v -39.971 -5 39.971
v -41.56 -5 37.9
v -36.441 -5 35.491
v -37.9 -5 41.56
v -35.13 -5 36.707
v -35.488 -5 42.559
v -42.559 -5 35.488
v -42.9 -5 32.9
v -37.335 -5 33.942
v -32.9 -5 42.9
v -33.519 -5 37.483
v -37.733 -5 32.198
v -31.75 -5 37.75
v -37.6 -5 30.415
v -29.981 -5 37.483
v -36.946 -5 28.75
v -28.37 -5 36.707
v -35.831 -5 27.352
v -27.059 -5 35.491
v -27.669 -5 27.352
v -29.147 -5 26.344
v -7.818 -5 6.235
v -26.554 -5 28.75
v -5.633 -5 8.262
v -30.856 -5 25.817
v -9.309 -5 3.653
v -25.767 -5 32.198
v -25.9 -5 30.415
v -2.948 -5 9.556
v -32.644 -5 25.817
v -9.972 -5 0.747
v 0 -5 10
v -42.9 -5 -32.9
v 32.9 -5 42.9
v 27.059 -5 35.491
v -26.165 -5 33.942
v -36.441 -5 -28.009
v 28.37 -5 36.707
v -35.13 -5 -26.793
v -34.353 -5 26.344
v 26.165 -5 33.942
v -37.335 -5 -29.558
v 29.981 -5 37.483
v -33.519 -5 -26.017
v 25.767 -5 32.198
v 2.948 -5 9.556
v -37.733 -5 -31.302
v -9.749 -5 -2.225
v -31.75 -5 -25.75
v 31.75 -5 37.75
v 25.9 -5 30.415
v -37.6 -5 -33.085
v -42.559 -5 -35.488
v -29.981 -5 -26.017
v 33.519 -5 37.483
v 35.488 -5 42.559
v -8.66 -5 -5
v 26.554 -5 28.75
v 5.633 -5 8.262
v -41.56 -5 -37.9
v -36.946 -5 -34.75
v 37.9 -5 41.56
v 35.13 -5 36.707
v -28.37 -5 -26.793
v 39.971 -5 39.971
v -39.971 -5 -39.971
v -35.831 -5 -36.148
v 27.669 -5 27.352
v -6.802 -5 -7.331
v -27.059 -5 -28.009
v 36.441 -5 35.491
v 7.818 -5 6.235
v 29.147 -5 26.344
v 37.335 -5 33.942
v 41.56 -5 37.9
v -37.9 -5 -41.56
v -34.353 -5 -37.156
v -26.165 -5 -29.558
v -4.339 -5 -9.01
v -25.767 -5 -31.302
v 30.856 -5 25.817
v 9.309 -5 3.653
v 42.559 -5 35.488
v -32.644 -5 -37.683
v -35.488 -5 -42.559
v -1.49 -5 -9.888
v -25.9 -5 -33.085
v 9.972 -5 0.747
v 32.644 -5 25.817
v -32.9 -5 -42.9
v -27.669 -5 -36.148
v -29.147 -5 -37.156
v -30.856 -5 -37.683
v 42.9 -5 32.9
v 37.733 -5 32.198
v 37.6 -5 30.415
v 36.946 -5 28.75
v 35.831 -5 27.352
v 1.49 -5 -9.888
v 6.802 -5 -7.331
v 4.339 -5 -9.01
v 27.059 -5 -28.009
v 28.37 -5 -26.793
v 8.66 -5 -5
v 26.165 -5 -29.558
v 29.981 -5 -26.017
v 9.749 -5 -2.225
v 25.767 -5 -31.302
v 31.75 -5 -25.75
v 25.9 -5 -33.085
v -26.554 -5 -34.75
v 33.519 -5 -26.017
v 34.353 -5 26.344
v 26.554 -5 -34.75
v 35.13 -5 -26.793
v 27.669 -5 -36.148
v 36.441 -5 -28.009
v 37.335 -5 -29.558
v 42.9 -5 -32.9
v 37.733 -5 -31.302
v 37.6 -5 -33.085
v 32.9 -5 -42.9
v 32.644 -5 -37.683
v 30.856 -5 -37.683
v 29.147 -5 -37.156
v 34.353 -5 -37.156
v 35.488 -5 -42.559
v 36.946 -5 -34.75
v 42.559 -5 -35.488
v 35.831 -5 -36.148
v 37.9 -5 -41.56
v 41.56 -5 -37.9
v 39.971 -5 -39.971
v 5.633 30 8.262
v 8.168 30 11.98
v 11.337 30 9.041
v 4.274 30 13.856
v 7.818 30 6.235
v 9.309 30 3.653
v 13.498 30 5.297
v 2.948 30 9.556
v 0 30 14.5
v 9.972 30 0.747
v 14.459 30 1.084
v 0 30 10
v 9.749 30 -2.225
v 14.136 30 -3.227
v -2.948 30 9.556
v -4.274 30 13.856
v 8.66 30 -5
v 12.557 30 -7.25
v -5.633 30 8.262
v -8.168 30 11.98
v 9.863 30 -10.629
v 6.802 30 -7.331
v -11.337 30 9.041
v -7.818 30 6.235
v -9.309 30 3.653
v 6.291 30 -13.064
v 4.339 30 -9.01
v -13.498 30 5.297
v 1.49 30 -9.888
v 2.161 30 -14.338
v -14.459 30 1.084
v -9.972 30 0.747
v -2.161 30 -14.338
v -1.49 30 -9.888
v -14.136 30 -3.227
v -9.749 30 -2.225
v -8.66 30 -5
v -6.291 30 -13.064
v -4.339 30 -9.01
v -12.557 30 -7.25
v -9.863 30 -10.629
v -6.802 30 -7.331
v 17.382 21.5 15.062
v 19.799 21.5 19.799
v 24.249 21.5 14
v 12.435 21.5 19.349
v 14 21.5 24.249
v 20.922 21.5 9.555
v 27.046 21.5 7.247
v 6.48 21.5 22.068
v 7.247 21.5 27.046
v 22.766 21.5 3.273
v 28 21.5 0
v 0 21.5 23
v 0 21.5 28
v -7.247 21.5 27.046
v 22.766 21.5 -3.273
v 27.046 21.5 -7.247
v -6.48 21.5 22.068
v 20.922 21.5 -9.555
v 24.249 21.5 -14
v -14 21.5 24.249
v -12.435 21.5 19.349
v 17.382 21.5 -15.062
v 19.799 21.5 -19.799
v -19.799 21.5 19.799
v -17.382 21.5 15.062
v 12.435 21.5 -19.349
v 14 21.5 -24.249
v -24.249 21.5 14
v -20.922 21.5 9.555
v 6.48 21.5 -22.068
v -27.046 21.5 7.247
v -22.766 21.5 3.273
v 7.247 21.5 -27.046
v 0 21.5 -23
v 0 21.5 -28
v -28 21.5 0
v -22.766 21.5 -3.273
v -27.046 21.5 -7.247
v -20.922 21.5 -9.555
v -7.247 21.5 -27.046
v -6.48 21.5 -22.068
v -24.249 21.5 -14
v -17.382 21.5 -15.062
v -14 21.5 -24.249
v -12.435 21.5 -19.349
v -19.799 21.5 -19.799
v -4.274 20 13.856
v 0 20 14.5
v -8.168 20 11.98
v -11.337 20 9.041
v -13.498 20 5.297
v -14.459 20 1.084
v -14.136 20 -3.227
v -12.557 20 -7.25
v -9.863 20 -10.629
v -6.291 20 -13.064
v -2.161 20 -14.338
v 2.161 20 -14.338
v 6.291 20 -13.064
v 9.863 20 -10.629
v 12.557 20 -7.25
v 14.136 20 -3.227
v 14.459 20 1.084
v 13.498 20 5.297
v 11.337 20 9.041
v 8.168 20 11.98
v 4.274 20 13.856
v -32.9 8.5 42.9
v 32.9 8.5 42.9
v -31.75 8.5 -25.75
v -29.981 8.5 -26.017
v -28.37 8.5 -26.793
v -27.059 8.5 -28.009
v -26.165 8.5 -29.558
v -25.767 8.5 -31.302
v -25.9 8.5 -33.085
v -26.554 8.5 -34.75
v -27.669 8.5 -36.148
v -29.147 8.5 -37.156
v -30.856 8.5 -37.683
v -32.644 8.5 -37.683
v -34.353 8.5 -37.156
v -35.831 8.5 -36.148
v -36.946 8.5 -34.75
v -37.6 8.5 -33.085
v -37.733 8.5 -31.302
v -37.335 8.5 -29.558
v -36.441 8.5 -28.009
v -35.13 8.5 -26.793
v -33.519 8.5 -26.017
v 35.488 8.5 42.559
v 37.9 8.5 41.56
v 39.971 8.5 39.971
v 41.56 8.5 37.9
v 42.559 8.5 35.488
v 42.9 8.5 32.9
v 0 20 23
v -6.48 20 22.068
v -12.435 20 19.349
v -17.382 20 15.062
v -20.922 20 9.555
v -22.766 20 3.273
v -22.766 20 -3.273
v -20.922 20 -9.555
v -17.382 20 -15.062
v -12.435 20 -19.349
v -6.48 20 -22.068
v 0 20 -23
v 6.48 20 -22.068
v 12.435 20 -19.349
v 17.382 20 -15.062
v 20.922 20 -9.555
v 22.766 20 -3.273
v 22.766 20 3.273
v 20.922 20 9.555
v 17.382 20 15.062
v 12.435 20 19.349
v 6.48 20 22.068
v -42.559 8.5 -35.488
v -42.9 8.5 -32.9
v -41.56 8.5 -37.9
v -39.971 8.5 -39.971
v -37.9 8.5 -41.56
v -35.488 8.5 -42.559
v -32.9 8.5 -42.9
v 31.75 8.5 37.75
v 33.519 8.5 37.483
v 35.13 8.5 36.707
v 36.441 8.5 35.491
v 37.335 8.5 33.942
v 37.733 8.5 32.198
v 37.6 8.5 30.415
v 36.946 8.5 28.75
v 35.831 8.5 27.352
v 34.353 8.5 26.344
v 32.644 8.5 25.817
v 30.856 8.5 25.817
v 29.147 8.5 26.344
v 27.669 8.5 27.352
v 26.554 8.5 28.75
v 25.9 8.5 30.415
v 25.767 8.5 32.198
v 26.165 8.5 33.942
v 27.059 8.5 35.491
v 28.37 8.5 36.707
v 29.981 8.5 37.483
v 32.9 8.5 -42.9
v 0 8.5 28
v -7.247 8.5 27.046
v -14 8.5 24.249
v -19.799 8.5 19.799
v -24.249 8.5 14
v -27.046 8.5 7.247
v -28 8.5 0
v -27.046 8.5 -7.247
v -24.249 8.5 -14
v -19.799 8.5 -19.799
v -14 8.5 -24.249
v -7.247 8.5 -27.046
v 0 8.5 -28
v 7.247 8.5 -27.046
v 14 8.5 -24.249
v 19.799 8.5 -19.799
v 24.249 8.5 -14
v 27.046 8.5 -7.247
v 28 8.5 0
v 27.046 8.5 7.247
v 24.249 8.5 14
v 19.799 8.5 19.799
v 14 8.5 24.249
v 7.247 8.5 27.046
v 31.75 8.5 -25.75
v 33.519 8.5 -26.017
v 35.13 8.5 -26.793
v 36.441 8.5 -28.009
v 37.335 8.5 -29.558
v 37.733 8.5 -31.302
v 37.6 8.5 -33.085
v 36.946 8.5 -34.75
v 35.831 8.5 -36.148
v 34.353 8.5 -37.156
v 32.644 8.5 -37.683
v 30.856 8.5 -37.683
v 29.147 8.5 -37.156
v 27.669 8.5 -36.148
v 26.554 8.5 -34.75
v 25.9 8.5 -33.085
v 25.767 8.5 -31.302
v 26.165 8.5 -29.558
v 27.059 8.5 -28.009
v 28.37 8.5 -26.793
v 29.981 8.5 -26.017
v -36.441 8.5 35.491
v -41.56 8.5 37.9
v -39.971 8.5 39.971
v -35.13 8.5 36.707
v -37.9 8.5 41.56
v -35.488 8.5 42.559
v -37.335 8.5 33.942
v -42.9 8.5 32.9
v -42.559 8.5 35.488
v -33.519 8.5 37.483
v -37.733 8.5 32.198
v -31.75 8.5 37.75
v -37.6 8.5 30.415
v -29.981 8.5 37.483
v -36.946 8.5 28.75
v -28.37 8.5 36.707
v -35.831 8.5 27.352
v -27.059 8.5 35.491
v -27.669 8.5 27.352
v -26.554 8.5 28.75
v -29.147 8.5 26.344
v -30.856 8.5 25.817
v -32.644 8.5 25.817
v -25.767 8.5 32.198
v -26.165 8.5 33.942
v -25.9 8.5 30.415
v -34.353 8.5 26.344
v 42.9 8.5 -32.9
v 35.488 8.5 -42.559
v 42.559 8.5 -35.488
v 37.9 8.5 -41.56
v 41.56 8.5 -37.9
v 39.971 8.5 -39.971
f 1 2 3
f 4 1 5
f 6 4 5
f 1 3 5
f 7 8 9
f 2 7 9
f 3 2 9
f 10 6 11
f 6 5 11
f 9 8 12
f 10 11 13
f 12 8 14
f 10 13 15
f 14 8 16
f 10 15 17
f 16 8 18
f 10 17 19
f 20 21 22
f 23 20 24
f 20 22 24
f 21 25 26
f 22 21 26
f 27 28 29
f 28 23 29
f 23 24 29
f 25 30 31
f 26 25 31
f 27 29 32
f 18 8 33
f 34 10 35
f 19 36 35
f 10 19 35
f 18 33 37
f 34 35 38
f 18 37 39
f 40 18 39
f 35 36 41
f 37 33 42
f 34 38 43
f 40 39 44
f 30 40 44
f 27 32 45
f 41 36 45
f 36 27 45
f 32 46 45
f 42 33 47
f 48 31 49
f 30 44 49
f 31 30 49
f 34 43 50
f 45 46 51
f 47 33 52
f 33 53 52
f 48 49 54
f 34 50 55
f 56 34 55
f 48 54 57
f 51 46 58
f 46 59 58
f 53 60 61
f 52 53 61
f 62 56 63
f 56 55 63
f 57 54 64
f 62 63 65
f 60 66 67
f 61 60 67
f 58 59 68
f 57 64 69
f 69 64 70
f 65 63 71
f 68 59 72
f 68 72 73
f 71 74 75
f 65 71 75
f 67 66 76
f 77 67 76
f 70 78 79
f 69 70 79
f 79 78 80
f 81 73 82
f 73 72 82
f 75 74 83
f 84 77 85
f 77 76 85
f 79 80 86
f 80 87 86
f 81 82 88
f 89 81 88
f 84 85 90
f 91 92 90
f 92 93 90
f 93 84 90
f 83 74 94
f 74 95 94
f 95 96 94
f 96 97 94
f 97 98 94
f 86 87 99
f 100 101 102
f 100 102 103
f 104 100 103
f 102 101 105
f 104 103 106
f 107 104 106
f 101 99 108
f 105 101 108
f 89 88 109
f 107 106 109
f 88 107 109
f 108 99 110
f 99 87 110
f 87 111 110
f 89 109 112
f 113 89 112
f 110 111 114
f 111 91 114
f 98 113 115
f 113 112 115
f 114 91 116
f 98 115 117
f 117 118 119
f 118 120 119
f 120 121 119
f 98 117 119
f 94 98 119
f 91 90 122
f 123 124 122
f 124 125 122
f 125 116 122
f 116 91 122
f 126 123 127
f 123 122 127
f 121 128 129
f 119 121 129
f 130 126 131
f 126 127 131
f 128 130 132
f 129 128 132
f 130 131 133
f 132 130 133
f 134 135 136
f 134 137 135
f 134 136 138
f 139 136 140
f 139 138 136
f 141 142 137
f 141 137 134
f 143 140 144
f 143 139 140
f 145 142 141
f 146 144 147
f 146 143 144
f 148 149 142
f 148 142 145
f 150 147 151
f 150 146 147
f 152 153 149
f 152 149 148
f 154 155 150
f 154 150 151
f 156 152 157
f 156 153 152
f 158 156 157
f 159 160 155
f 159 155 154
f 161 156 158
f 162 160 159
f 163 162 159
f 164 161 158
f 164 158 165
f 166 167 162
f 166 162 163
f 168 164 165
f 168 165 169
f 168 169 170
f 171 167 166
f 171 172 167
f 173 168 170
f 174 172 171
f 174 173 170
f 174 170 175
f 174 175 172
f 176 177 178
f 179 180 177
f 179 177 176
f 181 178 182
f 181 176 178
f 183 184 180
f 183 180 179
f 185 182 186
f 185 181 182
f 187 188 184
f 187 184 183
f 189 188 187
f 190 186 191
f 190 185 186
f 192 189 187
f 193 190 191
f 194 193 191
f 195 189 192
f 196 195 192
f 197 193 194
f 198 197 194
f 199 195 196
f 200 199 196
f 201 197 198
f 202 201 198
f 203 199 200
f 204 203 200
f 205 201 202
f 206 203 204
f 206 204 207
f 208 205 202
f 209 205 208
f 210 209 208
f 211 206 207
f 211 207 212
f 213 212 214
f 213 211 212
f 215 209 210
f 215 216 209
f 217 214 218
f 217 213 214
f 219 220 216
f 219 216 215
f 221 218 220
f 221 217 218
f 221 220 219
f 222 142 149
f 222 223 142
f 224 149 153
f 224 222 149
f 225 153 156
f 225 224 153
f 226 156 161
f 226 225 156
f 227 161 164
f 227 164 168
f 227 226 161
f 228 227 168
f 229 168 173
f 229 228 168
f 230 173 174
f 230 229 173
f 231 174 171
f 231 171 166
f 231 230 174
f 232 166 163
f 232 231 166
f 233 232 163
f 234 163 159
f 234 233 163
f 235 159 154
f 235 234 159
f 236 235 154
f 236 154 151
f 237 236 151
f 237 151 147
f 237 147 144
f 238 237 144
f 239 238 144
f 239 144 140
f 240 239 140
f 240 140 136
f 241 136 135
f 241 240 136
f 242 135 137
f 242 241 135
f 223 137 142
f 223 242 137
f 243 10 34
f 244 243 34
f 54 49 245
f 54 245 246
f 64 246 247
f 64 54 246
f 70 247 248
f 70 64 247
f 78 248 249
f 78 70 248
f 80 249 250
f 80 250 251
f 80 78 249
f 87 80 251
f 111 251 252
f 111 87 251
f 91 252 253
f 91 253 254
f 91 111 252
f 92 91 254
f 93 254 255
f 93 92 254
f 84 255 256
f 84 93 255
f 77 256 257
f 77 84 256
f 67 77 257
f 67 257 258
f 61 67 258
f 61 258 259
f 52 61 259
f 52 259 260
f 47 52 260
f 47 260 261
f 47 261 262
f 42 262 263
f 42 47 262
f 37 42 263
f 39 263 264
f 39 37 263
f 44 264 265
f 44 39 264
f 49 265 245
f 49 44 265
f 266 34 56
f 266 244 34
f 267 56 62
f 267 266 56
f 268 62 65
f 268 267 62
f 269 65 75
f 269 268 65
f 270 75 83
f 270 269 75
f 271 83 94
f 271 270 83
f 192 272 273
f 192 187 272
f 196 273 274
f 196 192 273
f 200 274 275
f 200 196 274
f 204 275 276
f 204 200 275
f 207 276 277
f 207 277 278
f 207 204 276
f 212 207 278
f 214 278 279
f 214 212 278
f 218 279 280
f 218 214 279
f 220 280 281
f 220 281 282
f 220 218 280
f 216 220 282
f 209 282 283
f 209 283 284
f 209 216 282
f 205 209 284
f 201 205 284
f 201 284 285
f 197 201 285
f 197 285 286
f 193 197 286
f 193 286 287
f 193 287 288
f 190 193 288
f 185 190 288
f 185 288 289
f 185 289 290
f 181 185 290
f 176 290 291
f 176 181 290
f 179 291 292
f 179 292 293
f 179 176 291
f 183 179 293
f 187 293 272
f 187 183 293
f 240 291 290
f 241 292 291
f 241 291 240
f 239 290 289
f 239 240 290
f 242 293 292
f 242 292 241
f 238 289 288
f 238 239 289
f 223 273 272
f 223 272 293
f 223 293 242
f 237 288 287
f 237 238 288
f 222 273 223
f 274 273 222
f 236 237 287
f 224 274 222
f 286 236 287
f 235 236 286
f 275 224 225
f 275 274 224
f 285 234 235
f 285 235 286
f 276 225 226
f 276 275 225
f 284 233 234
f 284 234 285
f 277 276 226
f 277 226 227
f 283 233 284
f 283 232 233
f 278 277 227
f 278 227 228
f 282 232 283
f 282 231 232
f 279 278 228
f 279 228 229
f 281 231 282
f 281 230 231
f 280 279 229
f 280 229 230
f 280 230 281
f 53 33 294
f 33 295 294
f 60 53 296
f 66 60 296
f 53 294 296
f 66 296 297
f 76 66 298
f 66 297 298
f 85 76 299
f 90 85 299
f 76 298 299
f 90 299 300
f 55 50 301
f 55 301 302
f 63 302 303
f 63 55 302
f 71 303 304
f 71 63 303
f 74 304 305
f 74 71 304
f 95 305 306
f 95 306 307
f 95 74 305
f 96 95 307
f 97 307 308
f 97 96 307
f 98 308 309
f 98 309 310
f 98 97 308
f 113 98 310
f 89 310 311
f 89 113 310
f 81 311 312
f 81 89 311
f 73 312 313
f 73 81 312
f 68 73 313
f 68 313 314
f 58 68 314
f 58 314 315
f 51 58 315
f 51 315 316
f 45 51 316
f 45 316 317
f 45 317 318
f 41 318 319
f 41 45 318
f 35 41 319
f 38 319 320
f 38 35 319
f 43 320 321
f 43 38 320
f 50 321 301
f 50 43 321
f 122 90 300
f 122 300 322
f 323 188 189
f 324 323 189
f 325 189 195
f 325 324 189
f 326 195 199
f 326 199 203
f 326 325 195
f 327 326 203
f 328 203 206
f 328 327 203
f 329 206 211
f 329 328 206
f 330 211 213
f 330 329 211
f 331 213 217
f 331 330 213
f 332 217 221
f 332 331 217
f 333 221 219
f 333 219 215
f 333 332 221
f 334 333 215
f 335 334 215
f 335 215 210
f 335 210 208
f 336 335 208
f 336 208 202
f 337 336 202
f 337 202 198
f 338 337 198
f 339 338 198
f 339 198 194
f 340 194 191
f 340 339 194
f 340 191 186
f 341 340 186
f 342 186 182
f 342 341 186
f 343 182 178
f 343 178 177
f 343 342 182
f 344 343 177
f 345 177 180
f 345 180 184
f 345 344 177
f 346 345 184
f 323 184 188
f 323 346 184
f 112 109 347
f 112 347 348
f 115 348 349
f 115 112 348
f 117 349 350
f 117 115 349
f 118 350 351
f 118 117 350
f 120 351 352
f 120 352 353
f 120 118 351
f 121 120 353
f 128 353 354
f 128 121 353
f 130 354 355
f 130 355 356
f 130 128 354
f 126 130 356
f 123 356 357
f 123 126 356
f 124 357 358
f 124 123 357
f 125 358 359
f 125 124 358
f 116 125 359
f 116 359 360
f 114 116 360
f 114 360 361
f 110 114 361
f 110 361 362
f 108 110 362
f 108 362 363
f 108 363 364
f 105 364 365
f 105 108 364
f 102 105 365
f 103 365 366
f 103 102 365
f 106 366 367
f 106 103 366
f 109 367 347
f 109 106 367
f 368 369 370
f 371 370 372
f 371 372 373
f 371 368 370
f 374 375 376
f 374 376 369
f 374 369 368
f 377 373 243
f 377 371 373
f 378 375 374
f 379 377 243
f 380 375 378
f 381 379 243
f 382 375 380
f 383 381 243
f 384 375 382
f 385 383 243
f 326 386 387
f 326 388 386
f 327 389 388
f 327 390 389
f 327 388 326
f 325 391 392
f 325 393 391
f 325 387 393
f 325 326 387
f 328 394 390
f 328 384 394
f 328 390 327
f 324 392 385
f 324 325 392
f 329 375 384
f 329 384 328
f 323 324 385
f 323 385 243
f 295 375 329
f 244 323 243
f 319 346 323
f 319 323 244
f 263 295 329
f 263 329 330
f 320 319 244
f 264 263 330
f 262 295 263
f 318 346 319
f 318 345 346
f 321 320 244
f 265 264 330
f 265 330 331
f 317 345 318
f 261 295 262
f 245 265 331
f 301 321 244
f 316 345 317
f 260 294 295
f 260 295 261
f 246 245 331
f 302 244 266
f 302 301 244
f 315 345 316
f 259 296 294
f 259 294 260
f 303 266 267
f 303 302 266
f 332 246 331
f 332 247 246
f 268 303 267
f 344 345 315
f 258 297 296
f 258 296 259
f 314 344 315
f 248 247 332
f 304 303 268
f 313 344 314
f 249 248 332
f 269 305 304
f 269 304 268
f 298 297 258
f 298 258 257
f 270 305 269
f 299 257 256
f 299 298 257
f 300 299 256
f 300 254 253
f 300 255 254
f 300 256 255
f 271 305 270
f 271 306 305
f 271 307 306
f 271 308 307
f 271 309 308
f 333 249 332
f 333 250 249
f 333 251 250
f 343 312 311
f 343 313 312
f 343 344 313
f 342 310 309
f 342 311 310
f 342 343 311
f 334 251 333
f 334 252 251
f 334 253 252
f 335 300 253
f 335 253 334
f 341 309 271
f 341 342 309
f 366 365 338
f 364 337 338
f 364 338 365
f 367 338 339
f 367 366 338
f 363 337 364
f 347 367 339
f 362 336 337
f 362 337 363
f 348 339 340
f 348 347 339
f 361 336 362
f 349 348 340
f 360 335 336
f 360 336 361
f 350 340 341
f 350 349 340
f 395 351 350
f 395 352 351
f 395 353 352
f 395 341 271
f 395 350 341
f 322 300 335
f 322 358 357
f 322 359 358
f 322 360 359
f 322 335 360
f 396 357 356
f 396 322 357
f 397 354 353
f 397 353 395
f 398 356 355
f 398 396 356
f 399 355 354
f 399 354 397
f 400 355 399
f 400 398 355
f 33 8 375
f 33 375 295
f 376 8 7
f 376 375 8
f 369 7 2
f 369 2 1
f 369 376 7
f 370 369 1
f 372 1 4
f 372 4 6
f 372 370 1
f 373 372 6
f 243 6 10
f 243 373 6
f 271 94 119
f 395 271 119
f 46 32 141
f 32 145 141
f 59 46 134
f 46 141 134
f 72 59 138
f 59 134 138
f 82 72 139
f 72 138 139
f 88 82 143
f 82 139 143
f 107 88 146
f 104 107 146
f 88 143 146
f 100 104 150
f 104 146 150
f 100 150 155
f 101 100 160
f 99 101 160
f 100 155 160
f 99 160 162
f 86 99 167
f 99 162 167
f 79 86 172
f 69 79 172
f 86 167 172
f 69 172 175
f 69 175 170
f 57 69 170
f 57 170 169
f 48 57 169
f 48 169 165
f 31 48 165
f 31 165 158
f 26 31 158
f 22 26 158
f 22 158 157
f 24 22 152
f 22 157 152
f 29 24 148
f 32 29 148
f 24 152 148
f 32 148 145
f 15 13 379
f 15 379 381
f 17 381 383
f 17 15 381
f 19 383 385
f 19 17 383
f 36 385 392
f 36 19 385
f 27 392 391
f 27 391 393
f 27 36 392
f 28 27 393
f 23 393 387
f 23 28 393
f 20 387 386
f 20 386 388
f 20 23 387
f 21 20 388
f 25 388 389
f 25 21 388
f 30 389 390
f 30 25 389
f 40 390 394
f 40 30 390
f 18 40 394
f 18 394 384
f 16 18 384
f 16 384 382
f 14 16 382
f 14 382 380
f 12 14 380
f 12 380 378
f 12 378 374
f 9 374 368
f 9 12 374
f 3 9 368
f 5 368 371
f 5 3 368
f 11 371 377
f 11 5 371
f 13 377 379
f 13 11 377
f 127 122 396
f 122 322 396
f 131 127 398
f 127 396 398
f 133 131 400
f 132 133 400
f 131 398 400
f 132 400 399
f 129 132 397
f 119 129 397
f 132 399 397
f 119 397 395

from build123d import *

# Parameters (mm, degrees)
SKETCH_2_W          = 85.8
SKETCH_2_H          = 85.8
SKETCH_2_R          = 6
EXTRUDE_1_DEPTH     = 13.5
FILLET_1_R          = 10
SKETCH_3_R          = 10
CUT_EXTRUDE_1_DEPTH = 65.366683929


with BuildPart() as part:
    # 草图1 → 旋转1 (revolve)
    with BuildSketch(Plane.XY, mode=Mode.PRIVATE) as revolve_1_sk:
        Polygon((10, 30), (14.5, 30), (14.5, 20), (23, 20), (23, 21.5), (28, 21.5), (28, 3.5), (14.5, 3.5), (14.5, 0), (10, 0), align=None)
    revolve(revolve_1_sk.sketch.rotate(Axis((0, 50.942477876, 0), (0, -1, 0)), 90), axis=Axis((0, 50.942477876, 0), (0, -1, 0)))

    # 草图2 → 凸台-拉伸1 (add)
    with BuildSketch(Plane(origin=(0, -5, 0), x_dir=(1, 0, 0), z_dir=(0, 1, 0))):
        Rectangle(SKETCH_2_W, SKETCH_2_H)
        with Locations(Location((-31.75, 31.75, 0), (0, 0, 270))):
            Circle(SKETCH_2_R, mode=Mode.SUBTRACT)
        with Locations(Location((31.75, 31.75, 0), (0, 0, 270))):
            Circle(SKETCH_2_R, mode=Mode.SUBTRACT)
        with Locations(Location((31.75, -31.75, 0), (0, 0, 270))):
            Circle(SKETCH_2_R, mode=Mode.SUBTRACT)
        with Locations(Location((-31.75, -31.75, 0), (0, 0, 270))):
            Circle(SKETCH_2_R, mode=Mode.SUBTRACT)
    extrude(amount=EXTRUDE_1_DEPTH)

    # 圆角1
    fillet_1_edges = [part.edges().sort_by_distance(p)[0] for p in [
        (42.9, 1.75, 42.9),
        (42.9, 1.75, -42.9),
        (-42.9, 1.75, -42.9),
        (-42.9, 1.75, 42.9),
    ]]
    fillet(fillet_1_edges, radius=FILLET_1_R)

    # 草图3 → 切除-拉伸1 (cut, through all)
    with BuildSketch(Plane(origin=(0, 8.5, 0), x_dir=(1, 0, 0), z_dir=(0, 1, 0))):
        with Locations(Location((0, 0, 0), (0, 0, 270))):
            Circle(SKETCH_3_R)
    extrude(amount=-CUT_EXTRUDE_1_DEPTH, mode=Mode.SUBTRACT)


solid = part.part
